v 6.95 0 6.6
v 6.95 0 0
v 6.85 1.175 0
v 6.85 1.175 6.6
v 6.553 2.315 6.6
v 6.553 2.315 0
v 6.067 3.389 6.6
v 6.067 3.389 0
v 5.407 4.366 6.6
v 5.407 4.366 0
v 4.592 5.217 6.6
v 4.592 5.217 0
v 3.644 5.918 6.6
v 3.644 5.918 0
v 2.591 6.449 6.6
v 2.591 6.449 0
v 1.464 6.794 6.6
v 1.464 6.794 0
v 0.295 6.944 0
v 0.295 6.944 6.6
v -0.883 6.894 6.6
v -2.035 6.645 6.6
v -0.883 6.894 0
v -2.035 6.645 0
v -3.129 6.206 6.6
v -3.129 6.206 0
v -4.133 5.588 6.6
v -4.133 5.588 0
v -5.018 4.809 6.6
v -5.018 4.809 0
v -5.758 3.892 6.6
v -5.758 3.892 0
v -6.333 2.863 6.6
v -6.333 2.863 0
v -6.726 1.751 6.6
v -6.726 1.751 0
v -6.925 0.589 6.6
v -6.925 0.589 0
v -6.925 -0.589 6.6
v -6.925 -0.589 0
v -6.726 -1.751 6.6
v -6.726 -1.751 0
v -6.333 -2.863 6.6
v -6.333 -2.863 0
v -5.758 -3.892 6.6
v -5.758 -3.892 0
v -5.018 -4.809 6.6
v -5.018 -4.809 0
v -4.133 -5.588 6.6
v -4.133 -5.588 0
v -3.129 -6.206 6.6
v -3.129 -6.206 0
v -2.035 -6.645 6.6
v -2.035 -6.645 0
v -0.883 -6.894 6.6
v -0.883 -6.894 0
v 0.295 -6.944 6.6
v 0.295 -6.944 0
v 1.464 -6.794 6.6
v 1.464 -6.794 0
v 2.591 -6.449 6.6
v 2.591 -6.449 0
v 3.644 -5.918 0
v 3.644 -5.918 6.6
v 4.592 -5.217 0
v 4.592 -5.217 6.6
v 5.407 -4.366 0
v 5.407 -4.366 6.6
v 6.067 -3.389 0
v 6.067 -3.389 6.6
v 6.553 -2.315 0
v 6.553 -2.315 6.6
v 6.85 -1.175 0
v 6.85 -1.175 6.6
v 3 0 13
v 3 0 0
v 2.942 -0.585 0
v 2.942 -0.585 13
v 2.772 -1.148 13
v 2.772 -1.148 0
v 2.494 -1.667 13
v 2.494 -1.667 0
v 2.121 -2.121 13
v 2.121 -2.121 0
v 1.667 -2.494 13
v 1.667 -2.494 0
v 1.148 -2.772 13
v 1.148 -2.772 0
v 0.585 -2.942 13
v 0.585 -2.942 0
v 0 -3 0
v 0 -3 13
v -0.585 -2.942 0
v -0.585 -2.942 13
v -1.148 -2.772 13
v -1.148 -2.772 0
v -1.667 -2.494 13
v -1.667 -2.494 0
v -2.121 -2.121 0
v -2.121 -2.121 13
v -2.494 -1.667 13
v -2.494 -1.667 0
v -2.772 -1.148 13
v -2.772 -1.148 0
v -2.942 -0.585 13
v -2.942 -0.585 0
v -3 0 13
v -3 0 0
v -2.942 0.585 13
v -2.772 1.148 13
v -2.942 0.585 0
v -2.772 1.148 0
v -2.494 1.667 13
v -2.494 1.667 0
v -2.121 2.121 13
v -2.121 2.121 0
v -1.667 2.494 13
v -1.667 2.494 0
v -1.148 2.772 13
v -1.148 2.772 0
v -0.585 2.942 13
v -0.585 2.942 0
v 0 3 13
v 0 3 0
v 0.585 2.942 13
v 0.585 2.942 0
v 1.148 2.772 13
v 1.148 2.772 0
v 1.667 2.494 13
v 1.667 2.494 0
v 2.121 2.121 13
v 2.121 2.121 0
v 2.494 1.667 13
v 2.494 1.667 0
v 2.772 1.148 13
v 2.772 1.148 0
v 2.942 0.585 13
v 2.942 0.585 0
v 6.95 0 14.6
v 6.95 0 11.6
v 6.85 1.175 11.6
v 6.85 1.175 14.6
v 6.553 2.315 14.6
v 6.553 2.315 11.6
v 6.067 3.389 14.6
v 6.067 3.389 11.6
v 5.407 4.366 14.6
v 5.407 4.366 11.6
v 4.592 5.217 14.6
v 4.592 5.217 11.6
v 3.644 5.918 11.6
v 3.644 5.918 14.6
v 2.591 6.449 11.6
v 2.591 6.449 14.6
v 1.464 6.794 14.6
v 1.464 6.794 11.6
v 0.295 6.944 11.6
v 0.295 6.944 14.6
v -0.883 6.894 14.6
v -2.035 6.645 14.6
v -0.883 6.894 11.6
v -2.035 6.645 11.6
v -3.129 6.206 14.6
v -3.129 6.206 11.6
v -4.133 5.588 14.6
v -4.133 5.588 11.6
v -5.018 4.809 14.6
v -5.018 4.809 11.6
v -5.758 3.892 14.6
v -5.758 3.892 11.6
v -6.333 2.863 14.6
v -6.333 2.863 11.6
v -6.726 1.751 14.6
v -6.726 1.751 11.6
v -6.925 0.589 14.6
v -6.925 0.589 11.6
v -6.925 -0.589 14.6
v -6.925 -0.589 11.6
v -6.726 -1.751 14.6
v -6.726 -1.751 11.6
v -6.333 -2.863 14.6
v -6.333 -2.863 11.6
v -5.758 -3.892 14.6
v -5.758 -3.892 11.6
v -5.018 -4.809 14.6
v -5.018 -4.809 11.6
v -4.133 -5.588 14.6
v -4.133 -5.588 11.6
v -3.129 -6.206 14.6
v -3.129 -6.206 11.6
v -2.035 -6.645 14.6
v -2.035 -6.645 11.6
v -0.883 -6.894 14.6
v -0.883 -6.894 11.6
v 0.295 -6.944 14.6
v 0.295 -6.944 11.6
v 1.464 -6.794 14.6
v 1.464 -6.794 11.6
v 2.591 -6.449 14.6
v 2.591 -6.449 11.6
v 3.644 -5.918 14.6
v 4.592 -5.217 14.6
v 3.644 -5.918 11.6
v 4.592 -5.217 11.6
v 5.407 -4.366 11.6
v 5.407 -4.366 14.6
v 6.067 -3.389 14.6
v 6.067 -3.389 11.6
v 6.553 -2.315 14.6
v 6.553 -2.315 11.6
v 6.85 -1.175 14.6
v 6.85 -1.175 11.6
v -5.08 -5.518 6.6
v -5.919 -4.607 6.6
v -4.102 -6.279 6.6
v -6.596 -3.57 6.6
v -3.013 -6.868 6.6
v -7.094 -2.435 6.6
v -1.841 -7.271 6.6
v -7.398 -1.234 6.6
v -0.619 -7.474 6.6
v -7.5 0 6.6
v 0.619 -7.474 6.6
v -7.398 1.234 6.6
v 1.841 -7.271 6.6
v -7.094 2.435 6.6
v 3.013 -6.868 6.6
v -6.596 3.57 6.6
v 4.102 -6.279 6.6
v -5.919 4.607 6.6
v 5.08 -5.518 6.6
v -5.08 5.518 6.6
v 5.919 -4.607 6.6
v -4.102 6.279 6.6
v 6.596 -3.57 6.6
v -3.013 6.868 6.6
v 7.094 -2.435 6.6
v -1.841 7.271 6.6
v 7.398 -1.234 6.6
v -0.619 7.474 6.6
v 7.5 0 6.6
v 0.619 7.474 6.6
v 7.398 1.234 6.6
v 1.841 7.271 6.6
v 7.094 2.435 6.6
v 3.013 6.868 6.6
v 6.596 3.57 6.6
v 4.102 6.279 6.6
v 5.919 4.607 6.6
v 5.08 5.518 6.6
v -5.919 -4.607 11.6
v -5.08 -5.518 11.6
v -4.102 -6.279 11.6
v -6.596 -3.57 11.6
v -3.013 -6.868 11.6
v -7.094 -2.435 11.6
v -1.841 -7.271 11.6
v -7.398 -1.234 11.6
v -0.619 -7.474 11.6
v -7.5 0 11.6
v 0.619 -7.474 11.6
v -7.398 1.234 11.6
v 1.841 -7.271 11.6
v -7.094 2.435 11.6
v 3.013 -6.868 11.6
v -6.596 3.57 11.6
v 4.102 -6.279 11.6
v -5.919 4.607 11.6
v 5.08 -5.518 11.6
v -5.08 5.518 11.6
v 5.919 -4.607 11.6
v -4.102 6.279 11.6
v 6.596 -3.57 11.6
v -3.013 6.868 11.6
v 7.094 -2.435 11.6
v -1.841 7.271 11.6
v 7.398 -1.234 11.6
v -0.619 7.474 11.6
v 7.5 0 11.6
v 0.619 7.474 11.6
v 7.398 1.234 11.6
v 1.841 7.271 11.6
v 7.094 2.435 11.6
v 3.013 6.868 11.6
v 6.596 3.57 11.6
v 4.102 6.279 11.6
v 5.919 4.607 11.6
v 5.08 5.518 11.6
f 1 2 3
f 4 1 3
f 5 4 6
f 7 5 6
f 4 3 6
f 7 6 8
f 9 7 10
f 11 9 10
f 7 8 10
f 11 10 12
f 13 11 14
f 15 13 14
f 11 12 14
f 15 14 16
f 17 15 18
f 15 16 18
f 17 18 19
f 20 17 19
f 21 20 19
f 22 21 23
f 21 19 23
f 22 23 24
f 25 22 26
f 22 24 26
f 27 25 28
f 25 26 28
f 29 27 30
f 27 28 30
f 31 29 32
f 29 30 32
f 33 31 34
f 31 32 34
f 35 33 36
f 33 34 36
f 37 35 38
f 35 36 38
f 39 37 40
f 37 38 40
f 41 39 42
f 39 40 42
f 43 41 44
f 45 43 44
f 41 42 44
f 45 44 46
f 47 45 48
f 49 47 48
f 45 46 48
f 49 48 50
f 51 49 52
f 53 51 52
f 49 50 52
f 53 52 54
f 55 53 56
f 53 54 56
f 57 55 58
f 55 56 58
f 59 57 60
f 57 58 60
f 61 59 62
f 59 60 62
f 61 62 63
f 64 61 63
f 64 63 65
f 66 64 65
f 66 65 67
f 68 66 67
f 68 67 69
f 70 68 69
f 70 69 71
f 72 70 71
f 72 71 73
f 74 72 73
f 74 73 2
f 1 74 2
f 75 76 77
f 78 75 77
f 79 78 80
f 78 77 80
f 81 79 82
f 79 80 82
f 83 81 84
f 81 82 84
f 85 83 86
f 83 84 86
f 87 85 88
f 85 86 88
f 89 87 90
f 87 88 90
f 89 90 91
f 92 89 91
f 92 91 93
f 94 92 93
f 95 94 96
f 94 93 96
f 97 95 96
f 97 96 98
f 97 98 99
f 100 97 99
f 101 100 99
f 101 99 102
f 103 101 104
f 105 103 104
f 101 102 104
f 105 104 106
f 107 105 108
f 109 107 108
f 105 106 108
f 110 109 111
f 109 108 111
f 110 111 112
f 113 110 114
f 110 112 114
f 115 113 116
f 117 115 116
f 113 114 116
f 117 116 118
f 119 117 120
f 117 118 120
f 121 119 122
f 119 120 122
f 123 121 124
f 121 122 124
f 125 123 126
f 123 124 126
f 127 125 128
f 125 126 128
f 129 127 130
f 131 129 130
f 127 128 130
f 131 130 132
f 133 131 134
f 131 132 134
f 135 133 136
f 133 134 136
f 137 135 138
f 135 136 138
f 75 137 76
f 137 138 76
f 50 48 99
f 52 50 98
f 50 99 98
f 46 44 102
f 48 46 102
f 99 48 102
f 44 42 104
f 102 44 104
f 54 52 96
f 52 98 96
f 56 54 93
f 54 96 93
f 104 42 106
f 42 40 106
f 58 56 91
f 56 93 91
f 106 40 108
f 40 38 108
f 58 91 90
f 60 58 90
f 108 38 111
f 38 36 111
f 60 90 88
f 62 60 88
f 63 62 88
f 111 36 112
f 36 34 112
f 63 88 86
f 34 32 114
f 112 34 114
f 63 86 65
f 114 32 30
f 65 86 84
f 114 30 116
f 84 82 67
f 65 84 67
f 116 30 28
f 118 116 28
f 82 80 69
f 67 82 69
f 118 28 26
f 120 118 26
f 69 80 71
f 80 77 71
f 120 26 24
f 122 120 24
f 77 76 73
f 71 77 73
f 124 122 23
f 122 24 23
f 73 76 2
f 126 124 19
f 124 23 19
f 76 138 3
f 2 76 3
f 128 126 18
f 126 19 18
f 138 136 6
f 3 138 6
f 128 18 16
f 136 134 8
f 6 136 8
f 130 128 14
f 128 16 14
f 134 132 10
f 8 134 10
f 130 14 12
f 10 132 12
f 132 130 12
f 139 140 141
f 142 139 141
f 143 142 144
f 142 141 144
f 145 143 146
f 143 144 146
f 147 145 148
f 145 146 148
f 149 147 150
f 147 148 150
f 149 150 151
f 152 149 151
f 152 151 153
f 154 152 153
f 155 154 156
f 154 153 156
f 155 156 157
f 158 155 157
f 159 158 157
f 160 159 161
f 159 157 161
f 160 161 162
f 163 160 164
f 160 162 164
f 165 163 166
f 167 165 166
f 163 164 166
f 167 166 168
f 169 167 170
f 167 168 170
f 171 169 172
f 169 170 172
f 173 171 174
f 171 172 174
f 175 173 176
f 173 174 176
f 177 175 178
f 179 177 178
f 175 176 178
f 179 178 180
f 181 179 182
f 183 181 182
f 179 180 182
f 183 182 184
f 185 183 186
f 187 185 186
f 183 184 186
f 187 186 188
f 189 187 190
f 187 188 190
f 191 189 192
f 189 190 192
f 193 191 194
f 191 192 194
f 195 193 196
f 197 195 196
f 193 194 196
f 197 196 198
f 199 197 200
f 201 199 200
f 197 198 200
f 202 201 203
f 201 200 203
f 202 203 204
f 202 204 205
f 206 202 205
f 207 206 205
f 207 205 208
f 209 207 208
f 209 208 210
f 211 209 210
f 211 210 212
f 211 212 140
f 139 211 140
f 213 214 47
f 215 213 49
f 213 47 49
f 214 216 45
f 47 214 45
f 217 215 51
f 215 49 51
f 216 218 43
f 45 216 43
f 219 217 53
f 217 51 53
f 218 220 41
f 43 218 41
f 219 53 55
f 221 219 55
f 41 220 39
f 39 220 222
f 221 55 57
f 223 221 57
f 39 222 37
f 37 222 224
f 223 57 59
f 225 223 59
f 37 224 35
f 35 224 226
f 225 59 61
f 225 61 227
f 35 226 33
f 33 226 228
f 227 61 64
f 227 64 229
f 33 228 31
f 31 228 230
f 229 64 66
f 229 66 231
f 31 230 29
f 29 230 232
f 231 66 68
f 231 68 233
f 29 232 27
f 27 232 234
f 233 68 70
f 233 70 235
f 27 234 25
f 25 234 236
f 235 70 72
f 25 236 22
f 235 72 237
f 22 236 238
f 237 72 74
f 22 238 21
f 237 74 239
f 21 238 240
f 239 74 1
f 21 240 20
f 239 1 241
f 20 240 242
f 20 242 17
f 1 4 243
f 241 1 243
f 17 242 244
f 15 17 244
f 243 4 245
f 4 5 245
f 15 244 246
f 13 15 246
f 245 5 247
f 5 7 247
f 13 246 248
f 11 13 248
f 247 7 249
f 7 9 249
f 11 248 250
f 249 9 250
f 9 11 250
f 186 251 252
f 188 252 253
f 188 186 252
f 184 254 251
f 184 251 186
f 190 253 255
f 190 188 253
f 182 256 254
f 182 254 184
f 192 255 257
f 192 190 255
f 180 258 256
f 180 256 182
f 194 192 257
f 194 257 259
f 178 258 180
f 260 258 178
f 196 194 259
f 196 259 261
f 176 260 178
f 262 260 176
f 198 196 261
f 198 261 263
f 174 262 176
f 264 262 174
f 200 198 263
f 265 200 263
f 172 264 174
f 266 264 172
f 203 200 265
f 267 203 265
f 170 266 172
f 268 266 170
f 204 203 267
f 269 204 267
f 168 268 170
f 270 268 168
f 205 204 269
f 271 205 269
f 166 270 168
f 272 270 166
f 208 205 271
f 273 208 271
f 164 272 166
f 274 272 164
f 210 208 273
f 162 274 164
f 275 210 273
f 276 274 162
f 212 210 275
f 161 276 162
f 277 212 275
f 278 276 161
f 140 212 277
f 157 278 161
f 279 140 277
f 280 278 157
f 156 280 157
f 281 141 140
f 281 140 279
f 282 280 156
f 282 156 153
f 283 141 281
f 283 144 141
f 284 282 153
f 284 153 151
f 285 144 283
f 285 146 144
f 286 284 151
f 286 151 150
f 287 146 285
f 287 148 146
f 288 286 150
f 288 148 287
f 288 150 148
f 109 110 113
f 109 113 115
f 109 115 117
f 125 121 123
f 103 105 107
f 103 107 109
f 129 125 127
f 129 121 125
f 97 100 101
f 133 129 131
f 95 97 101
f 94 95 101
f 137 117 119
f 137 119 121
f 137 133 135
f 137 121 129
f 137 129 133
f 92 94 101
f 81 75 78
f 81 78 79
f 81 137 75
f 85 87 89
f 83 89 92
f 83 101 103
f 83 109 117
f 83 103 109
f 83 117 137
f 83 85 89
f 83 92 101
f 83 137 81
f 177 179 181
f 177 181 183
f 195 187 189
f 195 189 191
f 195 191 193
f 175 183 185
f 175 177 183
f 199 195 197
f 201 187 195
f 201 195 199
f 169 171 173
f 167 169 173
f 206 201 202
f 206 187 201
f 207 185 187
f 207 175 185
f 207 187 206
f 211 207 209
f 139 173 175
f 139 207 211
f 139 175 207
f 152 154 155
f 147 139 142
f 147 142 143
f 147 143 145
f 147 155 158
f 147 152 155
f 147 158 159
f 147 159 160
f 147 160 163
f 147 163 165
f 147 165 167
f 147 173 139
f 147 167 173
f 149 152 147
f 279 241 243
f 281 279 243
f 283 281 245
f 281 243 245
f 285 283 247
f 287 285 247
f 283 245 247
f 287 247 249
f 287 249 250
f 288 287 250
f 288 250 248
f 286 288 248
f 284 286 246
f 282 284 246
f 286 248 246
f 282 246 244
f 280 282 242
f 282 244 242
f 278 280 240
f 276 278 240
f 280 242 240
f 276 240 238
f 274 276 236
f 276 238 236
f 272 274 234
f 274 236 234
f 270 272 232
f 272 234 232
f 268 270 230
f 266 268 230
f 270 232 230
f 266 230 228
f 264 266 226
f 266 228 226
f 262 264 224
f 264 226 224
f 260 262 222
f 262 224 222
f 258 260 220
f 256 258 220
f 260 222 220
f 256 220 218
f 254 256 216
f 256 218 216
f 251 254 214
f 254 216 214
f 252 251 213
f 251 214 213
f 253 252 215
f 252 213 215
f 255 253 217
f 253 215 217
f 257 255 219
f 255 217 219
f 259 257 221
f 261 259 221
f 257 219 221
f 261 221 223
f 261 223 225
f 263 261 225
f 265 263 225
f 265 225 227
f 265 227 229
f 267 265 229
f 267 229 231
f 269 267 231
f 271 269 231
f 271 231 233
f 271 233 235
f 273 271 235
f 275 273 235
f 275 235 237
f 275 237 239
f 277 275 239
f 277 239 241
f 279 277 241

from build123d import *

# Parameters (mm, degrees)
F0_R     = 6.95
F1_DEPTH = 6.6
F2_R     = 7.5
F3_DEPTH = 5
F4_R     = 6.95
F5_DEPTH = 3
F6_R     = 3
F7_DEPTH = 13


with BuildPart() as f1:
    # F0 (on Top) → F1 (new body)
    with BuildSketch(Plane.XY):
        Circle(F0_R)
    extrude(amount=F1_DEPTH)

    # F2 (on face) → F3 (join)
    with BuildSketch(Plane.XY.offset(6.6)):
        Circle(F2_R)
    extrude(amount=F3_DEPTH)

    # F4 (on face) → F5 (join)
    with BuildSketch(Plane.XY.offset(11.6)):
        Circle(F4_R)
    extrude(amount=F5_DEPTH)

    # F6 (on face) → F7 (cut)
    with BuildSketch(Plane(origin=(0, 0, 0), x_dir=(1, 0, 0), z_dir=(0, 0, -1))):
        Circle(F6_R)
    extrude(amount=-F7_DEPTH, mode=Mode.SUBTRACT)


solid = f1.part
